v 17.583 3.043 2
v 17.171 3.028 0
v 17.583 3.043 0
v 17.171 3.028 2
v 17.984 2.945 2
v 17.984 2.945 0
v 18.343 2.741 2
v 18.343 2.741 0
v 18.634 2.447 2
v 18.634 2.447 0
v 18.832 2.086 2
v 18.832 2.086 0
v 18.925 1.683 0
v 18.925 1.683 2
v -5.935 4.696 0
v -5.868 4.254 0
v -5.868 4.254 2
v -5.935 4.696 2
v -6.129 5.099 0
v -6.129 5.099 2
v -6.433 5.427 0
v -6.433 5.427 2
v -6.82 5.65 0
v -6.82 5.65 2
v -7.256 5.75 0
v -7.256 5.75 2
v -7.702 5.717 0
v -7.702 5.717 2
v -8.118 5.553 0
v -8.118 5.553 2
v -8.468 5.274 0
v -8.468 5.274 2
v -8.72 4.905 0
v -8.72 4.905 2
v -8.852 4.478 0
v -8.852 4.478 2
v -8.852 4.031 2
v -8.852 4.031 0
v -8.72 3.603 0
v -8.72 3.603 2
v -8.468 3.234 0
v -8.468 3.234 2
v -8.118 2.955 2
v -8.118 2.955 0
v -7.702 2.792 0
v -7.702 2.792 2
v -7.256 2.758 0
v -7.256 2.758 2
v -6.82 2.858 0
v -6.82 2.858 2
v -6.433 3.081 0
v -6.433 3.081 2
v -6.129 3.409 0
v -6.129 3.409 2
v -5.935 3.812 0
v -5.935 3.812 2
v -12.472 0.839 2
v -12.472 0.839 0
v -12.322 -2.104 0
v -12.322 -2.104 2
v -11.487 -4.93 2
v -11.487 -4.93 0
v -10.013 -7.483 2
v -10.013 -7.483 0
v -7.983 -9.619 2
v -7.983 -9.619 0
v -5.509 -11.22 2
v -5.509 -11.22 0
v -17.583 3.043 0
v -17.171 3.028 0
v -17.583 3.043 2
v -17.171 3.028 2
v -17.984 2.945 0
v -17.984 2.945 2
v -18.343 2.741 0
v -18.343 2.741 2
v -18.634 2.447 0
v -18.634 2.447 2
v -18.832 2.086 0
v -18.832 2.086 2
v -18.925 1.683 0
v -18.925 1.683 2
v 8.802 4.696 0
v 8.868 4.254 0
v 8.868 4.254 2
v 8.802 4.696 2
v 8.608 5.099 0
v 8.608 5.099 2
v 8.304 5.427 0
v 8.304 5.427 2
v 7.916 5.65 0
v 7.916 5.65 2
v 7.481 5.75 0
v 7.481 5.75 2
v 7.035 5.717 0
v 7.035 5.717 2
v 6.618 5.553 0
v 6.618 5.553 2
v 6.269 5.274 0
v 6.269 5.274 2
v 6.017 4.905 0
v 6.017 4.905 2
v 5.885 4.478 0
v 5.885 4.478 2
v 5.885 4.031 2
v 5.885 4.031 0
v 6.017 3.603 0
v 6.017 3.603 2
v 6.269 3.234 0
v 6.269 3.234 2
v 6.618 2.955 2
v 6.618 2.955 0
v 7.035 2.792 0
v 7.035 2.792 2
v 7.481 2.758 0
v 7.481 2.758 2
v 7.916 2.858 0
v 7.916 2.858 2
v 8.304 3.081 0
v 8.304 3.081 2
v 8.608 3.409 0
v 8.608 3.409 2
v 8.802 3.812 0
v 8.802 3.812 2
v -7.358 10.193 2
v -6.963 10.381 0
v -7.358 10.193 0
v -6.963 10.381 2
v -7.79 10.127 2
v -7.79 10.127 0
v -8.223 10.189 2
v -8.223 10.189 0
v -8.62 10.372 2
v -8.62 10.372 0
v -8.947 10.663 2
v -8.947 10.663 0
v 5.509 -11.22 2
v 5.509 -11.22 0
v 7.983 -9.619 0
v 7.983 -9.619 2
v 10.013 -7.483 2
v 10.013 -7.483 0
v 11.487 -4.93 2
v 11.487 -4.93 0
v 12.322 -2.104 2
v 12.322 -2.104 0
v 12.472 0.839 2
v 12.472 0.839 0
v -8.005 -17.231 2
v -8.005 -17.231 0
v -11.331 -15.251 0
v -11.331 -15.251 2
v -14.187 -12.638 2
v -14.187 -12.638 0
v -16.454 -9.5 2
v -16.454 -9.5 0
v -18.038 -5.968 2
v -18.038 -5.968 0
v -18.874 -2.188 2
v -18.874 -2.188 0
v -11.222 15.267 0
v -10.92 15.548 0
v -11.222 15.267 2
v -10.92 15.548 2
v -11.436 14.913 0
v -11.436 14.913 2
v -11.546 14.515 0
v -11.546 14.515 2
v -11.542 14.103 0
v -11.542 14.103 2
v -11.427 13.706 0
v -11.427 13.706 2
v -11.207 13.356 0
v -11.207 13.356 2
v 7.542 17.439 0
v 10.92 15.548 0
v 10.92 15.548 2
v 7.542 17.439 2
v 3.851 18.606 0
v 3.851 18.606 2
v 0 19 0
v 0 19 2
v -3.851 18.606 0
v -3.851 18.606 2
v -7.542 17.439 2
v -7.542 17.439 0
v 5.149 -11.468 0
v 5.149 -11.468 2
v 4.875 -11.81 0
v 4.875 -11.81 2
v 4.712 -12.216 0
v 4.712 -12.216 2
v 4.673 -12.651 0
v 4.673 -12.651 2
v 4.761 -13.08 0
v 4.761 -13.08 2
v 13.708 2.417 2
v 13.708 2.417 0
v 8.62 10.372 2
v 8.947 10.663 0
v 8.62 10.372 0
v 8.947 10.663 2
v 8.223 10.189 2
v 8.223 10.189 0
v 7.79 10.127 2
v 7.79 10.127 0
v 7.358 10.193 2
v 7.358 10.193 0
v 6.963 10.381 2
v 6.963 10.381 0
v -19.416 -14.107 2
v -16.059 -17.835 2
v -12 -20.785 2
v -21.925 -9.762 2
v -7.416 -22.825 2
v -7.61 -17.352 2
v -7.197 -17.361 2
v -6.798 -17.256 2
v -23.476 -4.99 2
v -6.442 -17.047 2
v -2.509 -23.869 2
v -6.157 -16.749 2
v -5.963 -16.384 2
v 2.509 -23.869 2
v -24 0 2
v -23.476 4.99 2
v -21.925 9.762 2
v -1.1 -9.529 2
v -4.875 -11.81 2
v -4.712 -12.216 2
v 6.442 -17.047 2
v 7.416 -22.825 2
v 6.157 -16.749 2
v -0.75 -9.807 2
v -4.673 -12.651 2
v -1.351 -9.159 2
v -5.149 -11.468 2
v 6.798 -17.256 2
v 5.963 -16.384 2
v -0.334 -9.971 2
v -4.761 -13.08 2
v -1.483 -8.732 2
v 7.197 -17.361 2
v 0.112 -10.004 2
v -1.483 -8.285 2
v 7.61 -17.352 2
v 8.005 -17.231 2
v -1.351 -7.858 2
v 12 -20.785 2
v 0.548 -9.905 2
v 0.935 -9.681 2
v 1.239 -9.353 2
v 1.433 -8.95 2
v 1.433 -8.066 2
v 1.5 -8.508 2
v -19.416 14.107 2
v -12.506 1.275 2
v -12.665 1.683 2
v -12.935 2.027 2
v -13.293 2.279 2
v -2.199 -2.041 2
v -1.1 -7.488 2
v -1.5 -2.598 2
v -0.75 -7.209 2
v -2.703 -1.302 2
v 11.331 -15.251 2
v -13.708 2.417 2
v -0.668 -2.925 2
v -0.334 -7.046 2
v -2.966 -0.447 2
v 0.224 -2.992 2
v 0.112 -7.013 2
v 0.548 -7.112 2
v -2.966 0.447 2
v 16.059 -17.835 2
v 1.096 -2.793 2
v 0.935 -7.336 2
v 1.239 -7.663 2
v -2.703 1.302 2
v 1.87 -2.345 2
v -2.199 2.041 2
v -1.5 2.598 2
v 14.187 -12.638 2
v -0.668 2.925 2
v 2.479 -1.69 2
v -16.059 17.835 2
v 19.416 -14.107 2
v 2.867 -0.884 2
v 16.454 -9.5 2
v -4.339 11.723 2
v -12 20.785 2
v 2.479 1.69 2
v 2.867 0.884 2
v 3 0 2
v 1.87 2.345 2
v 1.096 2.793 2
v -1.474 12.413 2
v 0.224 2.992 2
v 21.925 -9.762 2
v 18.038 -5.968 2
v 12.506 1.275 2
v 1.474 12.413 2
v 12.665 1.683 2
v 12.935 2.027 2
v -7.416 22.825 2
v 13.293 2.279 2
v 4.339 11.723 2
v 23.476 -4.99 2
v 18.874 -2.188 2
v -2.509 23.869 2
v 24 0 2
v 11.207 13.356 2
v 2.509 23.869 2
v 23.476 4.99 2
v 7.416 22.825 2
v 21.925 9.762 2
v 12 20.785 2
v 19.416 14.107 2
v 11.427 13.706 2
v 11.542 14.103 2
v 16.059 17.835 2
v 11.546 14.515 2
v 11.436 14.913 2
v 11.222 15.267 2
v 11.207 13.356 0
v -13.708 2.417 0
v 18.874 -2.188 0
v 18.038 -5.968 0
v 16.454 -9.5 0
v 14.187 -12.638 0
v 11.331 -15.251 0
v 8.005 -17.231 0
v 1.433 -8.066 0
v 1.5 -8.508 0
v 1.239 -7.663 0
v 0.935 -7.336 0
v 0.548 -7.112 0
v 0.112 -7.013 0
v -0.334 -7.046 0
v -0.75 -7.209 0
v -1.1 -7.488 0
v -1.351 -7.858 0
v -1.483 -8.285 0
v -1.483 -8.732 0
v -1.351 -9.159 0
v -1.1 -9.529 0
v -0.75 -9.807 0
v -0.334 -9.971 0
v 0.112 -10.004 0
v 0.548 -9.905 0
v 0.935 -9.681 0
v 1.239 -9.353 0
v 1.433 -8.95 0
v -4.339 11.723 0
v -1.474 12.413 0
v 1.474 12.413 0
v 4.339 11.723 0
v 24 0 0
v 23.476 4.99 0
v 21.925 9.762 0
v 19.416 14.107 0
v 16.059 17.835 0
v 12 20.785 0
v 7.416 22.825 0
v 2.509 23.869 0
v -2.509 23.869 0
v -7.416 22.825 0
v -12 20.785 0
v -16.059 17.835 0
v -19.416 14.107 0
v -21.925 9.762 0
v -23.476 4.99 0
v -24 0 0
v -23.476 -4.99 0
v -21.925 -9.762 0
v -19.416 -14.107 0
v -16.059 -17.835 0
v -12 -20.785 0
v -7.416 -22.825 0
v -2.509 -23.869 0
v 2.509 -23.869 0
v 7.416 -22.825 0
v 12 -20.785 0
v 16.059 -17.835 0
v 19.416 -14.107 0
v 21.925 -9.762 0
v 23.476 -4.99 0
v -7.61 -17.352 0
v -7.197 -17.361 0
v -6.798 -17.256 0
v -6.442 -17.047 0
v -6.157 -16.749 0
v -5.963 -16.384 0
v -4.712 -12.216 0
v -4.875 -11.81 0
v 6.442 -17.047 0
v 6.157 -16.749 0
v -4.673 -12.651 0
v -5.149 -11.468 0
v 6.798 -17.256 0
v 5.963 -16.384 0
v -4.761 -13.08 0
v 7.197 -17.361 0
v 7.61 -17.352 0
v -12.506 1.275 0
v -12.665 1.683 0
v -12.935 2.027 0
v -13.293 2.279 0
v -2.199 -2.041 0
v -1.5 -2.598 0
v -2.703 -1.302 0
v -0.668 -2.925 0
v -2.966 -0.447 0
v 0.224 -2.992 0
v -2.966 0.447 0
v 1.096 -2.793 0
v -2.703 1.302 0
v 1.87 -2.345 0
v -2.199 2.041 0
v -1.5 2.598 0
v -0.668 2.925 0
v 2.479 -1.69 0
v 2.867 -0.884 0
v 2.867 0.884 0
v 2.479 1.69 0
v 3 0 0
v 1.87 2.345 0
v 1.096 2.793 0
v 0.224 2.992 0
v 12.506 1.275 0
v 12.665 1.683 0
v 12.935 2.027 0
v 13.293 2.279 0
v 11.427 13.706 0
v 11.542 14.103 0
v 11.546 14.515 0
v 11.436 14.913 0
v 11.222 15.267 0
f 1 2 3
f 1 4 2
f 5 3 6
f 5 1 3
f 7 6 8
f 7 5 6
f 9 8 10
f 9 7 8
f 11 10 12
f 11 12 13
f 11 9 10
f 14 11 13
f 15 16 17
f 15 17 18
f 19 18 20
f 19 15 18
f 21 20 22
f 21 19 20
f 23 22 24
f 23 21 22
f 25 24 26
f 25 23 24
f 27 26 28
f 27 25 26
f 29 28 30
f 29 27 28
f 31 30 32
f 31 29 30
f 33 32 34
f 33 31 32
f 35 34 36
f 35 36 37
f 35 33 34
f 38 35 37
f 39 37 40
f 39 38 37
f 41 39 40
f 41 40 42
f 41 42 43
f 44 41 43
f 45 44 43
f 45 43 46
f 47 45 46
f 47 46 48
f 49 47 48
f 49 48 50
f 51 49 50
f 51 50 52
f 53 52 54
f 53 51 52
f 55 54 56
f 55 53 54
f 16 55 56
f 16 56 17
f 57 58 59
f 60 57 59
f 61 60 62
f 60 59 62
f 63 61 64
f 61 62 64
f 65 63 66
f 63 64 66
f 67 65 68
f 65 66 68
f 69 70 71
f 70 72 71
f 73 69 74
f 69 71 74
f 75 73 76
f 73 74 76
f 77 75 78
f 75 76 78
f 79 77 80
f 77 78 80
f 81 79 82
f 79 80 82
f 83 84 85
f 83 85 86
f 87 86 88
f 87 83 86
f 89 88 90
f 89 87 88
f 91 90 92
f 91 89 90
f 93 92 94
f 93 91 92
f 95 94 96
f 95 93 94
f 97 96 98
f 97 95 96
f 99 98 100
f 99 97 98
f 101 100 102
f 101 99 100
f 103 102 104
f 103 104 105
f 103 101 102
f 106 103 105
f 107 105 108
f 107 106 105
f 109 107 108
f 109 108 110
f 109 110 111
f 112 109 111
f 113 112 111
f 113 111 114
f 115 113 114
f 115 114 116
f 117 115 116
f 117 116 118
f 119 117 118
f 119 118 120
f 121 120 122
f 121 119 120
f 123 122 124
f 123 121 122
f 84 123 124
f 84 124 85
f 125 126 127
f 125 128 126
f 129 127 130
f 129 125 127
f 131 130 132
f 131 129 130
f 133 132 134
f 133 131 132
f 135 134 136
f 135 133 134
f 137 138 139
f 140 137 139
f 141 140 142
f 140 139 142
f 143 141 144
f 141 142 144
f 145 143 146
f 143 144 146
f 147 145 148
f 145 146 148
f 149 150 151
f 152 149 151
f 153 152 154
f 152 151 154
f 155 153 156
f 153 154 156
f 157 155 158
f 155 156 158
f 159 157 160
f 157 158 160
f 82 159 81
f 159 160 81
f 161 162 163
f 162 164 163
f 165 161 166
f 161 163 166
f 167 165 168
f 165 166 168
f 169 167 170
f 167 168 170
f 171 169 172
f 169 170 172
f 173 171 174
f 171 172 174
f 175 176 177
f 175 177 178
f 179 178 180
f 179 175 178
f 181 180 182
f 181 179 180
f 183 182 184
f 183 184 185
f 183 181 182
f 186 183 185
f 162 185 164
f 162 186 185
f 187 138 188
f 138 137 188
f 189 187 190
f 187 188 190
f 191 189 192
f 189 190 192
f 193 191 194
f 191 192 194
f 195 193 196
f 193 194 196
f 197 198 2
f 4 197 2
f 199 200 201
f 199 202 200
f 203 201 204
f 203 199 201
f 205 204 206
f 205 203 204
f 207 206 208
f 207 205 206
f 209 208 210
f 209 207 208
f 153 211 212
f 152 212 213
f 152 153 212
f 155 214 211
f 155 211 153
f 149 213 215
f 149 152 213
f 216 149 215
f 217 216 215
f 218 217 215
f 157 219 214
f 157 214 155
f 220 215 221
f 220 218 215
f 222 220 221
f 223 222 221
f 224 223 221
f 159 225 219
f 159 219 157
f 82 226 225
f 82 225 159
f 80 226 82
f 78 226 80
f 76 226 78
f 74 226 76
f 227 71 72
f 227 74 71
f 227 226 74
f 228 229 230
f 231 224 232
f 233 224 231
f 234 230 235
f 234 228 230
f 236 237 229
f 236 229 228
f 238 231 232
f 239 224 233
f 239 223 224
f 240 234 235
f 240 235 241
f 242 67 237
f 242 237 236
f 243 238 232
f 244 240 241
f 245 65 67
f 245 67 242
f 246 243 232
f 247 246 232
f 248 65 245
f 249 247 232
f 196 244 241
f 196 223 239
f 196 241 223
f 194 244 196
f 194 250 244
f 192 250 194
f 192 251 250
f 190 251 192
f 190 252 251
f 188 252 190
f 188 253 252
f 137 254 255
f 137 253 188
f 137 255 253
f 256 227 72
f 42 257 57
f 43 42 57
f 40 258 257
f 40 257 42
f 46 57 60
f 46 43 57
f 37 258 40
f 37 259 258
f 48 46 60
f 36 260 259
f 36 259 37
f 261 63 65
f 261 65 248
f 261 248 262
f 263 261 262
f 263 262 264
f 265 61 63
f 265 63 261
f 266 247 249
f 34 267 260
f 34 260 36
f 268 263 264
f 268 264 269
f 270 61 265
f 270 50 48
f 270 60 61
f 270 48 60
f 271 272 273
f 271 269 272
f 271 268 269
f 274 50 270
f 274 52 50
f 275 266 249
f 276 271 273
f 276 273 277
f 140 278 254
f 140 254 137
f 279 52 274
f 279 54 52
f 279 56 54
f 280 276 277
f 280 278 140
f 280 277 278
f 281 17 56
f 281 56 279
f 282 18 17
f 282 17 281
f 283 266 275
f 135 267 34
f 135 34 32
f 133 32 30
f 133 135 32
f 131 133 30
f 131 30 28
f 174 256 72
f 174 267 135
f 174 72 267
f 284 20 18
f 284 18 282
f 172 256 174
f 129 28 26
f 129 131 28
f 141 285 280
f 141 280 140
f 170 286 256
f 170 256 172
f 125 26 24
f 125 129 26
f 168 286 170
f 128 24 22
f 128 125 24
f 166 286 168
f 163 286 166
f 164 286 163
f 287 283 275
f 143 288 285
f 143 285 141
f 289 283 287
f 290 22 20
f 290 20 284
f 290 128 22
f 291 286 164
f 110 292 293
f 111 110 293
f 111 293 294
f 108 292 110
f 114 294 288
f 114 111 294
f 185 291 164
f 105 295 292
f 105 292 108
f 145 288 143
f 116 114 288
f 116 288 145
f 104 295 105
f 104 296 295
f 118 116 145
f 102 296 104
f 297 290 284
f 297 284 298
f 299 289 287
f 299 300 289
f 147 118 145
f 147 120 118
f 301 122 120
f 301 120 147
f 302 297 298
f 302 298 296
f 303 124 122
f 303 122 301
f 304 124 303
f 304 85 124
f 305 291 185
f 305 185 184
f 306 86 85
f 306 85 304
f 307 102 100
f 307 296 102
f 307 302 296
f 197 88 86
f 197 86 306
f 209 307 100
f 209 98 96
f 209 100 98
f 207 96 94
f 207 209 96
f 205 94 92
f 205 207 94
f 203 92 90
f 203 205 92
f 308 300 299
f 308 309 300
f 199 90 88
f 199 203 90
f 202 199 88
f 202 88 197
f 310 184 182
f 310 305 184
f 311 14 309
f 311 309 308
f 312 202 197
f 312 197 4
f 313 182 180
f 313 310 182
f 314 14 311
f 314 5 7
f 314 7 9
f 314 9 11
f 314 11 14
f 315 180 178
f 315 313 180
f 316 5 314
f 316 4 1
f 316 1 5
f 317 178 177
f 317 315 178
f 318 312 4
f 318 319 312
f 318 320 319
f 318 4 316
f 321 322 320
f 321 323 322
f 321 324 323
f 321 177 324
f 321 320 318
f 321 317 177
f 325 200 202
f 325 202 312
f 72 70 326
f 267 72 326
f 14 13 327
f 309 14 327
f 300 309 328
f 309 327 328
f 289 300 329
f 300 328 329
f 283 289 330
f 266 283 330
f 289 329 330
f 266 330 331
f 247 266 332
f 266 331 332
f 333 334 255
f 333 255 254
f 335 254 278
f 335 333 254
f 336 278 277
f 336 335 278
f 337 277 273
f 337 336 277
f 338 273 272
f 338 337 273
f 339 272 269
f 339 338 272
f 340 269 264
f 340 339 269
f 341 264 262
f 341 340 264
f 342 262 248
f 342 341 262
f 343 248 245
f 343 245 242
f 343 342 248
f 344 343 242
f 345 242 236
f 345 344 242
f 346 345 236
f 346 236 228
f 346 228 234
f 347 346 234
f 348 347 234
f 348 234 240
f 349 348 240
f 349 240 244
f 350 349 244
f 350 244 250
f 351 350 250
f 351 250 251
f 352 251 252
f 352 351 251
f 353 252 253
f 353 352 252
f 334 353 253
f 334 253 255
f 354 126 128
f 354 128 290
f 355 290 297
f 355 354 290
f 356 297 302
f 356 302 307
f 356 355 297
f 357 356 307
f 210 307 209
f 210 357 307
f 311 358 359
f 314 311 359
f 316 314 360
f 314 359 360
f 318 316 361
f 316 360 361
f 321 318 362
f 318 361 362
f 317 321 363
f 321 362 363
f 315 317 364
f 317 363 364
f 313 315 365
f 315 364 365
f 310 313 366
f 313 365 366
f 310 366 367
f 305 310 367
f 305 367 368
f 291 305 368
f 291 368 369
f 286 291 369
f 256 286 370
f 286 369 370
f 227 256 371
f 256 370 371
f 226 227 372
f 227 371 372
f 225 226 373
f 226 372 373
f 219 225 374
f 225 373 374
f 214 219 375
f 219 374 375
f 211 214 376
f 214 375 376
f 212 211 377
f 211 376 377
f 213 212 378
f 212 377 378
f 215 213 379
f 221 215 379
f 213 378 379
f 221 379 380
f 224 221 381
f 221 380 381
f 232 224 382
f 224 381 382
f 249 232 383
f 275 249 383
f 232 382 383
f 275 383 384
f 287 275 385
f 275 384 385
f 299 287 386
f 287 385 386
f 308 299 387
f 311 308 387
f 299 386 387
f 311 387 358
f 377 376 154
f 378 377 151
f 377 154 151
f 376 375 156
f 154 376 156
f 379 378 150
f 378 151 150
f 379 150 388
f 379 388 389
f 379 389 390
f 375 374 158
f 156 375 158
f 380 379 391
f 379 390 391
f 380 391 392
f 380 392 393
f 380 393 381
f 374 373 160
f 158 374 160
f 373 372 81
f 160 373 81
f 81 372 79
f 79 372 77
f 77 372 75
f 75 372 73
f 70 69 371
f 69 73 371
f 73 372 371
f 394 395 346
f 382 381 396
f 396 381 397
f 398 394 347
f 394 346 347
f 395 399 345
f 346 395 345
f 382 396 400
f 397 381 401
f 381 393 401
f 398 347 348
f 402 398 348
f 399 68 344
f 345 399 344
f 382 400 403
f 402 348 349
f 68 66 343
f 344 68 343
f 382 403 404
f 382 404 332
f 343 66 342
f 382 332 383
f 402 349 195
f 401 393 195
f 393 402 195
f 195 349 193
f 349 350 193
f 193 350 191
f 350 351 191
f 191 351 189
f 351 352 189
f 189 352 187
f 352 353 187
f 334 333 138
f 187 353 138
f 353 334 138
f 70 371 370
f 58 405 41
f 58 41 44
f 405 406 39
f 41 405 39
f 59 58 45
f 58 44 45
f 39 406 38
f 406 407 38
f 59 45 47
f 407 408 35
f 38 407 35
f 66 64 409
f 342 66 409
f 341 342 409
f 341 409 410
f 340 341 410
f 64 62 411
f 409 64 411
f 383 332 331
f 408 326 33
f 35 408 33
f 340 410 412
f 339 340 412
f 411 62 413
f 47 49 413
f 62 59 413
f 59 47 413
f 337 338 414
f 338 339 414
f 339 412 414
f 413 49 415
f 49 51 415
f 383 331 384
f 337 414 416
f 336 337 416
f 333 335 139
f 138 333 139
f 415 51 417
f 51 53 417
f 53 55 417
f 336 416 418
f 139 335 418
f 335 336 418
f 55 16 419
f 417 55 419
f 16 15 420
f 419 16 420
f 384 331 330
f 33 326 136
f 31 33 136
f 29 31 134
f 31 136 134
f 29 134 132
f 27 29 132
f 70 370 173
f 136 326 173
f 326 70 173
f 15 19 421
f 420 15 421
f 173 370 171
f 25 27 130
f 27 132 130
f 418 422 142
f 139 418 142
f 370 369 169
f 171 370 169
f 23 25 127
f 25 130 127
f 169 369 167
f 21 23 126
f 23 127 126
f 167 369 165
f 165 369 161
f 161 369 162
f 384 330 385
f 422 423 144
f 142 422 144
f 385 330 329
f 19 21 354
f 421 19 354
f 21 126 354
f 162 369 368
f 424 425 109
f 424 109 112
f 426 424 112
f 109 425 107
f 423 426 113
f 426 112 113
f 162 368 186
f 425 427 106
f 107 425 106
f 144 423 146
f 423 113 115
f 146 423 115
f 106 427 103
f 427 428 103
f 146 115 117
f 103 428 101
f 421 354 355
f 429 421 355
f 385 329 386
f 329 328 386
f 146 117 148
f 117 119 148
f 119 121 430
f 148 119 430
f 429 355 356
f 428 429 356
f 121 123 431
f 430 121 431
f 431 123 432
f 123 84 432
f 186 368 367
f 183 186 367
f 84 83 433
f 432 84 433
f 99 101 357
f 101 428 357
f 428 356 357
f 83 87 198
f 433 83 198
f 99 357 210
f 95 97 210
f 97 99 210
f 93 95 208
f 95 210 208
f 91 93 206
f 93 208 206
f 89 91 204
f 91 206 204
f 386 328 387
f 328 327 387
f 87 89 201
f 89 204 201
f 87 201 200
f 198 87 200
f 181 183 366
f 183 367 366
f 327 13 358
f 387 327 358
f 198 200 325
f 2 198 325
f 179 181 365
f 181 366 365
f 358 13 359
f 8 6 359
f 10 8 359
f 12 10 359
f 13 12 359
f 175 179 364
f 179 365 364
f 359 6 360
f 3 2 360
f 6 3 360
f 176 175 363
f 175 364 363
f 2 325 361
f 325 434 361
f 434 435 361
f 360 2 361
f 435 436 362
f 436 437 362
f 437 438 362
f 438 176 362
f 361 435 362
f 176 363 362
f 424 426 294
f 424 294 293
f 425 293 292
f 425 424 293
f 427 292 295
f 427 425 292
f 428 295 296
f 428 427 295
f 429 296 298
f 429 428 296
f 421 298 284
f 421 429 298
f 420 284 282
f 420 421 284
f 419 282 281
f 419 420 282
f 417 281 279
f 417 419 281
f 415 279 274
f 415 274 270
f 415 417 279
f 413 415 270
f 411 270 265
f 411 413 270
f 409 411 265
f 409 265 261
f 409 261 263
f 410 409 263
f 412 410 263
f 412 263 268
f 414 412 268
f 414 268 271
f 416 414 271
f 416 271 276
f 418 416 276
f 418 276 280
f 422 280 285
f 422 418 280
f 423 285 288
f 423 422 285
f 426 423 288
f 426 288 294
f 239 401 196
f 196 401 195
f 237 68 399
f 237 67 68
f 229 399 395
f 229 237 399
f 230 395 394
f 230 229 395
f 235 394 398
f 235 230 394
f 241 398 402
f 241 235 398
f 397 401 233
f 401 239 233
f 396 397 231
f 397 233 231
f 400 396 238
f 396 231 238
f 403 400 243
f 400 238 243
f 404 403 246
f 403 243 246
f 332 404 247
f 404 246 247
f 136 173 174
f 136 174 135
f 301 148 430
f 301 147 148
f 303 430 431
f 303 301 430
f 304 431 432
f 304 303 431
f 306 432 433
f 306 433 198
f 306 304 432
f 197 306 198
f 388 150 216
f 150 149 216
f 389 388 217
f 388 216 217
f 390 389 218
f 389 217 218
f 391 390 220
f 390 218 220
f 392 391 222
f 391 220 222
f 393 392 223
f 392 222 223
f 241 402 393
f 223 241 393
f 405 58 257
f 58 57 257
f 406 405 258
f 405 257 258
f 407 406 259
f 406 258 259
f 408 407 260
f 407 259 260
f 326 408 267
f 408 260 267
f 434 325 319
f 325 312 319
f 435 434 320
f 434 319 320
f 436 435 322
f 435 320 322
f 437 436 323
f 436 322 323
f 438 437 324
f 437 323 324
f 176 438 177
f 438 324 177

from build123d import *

# Parameters (mm, degrees)
SKETCH_1_R      = 24
SKETCH_1_R_2    = 3
SKETCH_1_R_3    = 1.5
EXTRUDE_1_DEPTH = 2
FILLET_1_R      = 1.5


with BuildPart() as part:
    # 草图1 → 凸台-拉伸1 (new body)
    with BuildSketch(Plane.XY):
        Circle(SKETCH_1_R)
        Circle(SKETCH_1_R_2, mode=Mode.SUBTRACT)
        with Locations((-7.368432559, 4.254166522)):
            Circle(SKETCH_1_R_3, mode=Mode.SUBTRACT)
        with Locations((7.368432559, 4.254166522)):
            Circle(SKETCH_1_R_3, mode=Mode.SUBTRACT)
        with Locations((0, -8.508333043)):
            Circle(SKETCH_1_R_3, mode=Mode.SUBTRACT)
        with BuildLine():
            Line((8.034845121, 9.575555539), (12.212964584, 14.554844419))
            ThreePointArc((12.212964584, 14.554844419), (0, 19), (-12.212964584, 14.554844419))
            Line((-12.212964584, 14.554844419), (-8.034845121, 9.575555539))
            ThreePointArc((-8.034845121, 9.575555539), (0, 12.5), (8.034845121, 9.575555539))
        make_face(mode=Mode.SUBTRACT)
        with BuildLine():
            Line((12.310096913, 2.170602221), (18.711347307, 3.299315376))
            ThreePointArc((18.711347307, 3.299315376), (16.454482672, -9.5), (6.498382723, -17.854159795))
            Line((6.498382723, -17.854159795), (4.275251792, -11.74615776))
            ThreePointArc((4.275251792, -11.74615776), (10.825317547, -6.25), (12.310096913, 2.170602221))
        make_face(mode=Mode.SUBTRACT)
        with BuildLine():
            Line((-4.275251792, -11.74615776), (-6.498382723, -17.854159795))
            ThreePointArc((-6.498382723, -17.854159795), (-16.454482672, -9.5), (-18.711347307, 3.299315376))
            Line((-18.711347307, 3.299315376), (-12.310096913, 2.170602221))
            ThreePointArc((-12.310096913, 2.170602221), (-10.825317547, -6.25), (-4.275251792, -11.74615776))
        make_face(mode=Mode.SUBTRACT)
    extrude(amount=EXTRUDE_1_DEPTH)

    # 圆角1
    fillet_1_edges = [part.edges().sort_by_distance(p)[0] for p in [
        (-8.034845121, 9.575555539, 1),
        (8.034845121, 9.575555539, 1),
        (12.212964584, 14.554844419, 1),
        (-12.212964584, 14.554844419, 1),
        (12.310096913, 2.170602221, 1),
        (4.275251792, -11.74615776, 1),
        (6.498382723, -17.854159795, 1),
        (18.711347307, 3.299315376, 1),
        (-4.275251792, -11.74615776, 1),
        (-12.310096913, 2.170602221, 1),
        (-18.711347307, 3.299315376, 1),
        (-6.498382723, -17.854159795, 1),
    ]]
    fillet(fillet_1_edges, radius=FILLET_1_R)


solid = part.part
